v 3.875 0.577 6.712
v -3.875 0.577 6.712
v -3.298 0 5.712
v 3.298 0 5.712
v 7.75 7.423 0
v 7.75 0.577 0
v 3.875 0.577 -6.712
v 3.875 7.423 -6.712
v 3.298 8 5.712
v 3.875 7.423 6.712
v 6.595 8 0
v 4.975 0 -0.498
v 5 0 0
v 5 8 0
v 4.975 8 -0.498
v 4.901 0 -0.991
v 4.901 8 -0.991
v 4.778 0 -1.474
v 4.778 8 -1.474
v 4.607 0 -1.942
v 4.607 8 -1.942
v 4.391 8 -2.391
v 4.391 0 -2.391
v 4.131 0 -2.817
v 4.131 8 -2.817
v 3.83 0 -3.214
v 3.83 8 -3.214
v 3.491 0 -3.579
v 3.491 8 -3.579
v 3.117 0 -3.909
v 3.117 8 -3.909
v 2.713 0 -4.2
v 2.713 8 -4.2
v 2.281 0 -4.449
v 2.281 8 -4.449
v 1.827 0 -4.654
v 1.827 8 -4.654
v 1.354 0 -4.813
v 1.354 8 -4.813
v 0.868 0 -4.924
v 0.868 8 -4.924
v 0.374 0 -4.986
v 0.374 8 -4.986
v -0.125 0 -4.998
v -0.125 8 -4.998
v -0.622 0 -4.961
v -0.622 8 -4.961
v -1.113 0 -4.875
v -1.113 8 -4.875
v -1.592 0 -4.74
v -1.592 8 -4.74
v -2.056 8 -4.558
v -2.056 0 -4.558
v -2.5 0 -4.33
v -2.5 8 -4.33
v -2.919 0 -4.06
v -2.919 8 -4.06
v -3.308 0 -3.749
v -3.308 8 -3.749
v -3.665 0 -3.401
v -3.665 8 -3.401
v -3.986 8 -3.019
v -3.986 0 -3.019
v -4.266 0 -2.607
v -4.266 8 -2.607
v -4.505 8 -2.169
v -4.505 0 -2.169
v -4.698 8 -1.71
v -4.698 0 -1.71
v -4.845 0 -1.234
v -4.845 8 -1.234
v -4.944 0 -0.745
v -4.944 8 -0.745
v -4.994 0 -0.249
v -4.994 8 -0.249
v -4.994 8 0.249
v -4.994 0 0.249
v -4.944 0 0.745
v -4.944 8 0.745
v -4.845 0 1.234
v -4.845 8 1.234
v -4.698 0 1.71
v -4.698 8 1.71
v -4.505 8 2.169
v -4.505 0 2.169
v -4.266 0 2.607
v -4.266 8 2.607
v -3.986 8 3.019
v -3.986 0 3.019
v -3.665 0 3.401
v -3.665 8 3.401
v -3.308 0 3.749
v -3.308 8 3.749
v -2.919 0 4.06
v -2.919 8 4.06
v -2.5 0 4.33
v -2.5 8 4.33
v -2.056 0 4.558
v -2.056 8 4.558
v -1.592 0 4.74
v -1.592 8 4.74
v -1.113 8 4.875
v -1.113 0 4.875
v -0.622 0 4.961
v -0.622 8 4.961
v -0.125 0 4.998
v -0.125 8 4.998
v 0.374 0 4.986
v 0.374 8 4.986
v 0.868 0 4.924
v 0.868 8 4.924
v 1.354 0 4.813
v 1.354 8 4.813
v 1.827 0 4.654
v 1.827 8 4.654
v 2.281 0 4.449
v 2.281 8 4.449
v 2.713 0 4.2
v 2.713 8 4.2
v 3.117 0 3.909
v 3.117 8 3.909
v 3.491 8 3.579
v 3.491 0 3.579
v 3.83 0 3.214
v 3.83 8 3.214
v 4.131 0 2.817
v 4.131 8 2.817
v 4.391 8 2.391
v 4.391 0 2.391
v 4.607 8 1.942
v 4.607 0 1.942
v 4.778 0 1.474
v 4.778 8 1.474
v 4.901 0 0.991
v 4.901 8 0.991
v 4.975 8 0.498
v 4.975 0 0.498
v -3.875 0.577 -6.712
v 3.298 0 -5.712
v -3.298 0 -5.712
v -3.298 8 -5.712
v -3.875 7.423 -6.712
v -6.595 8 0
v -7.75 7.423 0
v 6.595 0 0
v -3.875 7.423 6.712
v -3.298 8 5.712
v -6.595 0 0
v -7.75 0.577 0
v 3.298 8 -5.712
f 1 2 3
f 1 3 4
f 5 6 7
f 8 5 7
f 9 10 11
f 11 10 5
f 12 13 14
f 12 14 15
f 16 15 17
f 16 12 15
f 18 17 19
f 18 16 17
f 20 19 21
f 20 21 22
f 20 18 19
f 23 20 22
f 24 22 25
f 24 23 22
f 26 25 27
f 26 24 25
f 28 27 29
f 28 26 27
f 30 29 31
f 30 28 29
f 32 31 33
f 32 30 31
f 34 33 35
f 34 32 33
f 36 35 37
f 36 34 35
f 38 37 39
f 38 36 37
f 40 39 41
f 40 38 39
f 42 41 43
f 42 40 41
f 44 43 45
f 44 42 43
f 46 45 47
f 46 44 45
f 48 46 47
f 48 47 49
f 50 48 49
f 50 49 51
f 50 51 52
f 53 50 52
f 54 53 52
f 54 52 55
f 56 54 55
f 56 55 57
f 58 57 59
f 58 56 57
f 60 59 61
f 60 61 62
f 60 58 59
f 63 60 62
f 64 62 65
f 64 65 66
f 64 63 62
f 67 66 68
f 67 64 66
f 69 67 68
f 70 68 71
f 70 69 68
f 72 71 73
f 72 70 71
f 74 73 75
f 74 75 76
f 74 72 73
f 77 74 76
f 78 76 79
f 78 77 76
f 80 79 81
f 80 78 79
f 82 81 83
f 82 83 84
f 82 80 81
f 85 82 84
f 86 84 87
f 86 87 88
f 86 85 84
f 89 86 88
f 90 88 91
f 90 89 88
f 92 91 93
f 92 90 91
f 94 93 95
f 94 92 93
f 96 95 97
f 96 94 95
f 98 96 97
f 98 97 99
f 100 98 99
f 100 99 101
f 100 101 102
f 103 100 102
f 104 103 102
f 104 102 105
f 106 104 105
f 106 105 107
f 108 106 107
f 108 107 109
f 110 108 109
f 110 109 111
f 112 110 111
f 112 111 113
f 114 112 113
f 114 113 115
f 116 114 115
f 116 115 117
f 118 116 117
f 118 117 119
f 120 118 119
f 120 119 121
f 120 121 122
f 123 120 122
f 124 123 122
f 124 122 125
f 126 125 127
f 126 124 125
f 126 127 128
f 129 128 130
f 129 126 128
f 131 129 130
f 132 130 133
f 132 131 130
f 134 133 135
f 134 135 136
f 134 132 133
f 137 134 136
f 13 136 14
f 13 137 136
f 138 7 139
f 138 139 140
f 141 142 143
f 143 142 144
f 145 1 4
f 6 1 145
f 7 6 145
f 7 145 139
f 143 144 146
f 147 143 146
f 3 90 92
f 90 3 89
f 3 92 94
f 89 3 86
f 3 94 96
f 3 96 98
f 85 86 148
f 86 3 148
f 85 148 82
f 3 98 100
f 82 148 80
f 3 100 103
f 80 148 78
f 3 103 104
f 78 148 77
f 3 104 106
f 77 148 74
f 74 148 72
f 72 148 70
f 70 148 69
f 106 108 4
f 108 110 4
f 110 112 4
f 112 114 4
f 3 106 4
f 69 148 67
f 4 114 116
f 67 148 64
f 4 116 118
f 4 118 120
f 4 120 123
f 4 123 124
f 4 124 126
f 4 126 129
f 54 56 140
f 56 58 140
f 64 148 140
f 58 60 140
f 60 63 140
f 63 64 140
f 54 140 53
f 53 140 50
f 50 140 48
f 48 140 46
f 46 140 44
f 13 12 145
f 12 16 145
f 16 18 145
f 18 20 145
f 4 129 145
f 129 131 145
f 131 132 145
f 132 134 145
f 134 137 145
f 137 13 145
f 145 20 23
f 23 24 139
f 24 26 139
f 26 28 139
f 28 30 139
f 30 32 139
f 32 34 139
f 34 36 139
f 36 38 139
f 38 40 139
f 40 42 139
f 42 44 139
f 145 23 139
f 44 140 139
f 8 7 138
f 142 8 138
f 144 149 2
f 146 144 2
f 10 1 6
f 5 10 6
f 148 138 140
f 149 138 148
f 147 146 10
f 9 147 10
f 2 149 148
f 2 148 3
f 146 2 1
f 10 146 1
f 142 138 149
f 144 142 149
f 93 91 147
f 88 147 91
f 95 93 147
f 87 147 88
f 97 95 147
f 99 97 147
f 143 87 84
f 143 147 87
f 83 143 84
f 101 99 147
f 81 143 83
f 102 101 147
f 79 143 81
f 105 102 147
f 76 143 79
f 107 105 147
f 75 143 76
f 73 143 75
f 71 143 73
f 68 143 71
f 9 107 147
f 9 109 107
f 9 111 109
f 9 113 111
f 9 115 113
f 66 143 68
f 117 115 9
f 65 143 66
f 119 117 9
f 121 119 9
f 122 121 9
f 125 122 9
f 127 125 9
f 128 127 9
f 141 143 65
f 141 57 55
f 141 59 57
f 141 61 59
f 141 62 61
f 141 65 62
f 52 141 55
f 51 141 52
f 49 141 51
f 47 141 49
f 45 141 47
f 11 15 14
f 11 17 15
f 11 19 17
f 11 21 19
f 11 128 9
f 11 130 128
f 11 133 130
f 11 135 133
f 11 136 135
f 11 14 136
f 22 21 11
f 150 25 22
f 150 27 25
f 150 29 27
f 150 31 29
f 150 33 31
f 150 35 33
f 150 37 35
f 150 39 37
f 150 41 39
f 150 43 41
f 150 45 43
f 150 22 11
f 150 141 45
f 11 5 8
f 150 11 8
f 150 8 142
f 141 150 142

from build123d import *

# Parameters (mm, degrees)
SKETCH_1_R      = 5
EXTRUDE_1_DEPTH = 8
CHAMFER_1_SIZE  = 1
CHAMFER_1_SIZE2 = 0.577350269
CHAMFER_2_SIZE  = 1
CHAMFER_2_SIZE2 = 0.577350269


with BuildPart() as part:
    # Эскиз1 → Бобышка-Вытянуть1 (new body)
    with BuildSketch(Plane(origin=(0, 0, 0), x_dir=(1, 0, 0), z_dir=(0, 1, 0))):
        Polygon((-7.75, 0), (-3.875, -6.711696879), (3.875, -6.711696879), (7.75, 0), (3.875, 6.711696879), (-3.875, 6.711696879), align=None)
        Circle(SKETCH_1_R, mode=Mode.SUBTRACT)
    extrude(amount=EXTRUDE_1_DEPTH)

    # Фаска1
    chamfer_1_edges = [part.edges().sort_by_distance(p)[0] for p in [
        (0, 8, 6.711696879),
        (5.8125, 8, 3.35584844),
        (5.8125, 8, -3.35584844),
        (0, 8, -6.711696879),
        (-5.8125, 8, -3.35584844),
        (-5.8125, 8, 3.35584844),
    ]]
    chamfer_1_side = [part.faces().sort_by_distance(p)[0] for p in [
        (-5.634925192, 8, 3.253325576),
    ]]
    chamfer(chamfer_1_edges, length=CHAMFER_1_SIZE, length2=CHAMFER_1_SIZE2, reference=chamfer_1_side[0])

    # Фаска2
    chamfer_2_edges = [part.edges().sort_by_distance(p)[0] for p in [
        (0, 0, -6.711696879),
        (5.8125, 0, -3.35584844),
        (5.8125, 0, 3.35584844),
        (0, 0, 6.711696879),
        (-5.8125, 0, 3.35584844),
        (-5.8125, 0, -3.35584844),
    ]]
    chamfer_2_side = [part.faces().sort_by_distance(p)[0] for p in [
        (-5.634925192, 0, 3.253325576),
    ]]
    chamfer(chamfer_2_edges, length=CHAMFER_2_SIZE, length2=CHAMFER_2_SIZE2, reference=chamfer_2_side[0])


solid = part.part
